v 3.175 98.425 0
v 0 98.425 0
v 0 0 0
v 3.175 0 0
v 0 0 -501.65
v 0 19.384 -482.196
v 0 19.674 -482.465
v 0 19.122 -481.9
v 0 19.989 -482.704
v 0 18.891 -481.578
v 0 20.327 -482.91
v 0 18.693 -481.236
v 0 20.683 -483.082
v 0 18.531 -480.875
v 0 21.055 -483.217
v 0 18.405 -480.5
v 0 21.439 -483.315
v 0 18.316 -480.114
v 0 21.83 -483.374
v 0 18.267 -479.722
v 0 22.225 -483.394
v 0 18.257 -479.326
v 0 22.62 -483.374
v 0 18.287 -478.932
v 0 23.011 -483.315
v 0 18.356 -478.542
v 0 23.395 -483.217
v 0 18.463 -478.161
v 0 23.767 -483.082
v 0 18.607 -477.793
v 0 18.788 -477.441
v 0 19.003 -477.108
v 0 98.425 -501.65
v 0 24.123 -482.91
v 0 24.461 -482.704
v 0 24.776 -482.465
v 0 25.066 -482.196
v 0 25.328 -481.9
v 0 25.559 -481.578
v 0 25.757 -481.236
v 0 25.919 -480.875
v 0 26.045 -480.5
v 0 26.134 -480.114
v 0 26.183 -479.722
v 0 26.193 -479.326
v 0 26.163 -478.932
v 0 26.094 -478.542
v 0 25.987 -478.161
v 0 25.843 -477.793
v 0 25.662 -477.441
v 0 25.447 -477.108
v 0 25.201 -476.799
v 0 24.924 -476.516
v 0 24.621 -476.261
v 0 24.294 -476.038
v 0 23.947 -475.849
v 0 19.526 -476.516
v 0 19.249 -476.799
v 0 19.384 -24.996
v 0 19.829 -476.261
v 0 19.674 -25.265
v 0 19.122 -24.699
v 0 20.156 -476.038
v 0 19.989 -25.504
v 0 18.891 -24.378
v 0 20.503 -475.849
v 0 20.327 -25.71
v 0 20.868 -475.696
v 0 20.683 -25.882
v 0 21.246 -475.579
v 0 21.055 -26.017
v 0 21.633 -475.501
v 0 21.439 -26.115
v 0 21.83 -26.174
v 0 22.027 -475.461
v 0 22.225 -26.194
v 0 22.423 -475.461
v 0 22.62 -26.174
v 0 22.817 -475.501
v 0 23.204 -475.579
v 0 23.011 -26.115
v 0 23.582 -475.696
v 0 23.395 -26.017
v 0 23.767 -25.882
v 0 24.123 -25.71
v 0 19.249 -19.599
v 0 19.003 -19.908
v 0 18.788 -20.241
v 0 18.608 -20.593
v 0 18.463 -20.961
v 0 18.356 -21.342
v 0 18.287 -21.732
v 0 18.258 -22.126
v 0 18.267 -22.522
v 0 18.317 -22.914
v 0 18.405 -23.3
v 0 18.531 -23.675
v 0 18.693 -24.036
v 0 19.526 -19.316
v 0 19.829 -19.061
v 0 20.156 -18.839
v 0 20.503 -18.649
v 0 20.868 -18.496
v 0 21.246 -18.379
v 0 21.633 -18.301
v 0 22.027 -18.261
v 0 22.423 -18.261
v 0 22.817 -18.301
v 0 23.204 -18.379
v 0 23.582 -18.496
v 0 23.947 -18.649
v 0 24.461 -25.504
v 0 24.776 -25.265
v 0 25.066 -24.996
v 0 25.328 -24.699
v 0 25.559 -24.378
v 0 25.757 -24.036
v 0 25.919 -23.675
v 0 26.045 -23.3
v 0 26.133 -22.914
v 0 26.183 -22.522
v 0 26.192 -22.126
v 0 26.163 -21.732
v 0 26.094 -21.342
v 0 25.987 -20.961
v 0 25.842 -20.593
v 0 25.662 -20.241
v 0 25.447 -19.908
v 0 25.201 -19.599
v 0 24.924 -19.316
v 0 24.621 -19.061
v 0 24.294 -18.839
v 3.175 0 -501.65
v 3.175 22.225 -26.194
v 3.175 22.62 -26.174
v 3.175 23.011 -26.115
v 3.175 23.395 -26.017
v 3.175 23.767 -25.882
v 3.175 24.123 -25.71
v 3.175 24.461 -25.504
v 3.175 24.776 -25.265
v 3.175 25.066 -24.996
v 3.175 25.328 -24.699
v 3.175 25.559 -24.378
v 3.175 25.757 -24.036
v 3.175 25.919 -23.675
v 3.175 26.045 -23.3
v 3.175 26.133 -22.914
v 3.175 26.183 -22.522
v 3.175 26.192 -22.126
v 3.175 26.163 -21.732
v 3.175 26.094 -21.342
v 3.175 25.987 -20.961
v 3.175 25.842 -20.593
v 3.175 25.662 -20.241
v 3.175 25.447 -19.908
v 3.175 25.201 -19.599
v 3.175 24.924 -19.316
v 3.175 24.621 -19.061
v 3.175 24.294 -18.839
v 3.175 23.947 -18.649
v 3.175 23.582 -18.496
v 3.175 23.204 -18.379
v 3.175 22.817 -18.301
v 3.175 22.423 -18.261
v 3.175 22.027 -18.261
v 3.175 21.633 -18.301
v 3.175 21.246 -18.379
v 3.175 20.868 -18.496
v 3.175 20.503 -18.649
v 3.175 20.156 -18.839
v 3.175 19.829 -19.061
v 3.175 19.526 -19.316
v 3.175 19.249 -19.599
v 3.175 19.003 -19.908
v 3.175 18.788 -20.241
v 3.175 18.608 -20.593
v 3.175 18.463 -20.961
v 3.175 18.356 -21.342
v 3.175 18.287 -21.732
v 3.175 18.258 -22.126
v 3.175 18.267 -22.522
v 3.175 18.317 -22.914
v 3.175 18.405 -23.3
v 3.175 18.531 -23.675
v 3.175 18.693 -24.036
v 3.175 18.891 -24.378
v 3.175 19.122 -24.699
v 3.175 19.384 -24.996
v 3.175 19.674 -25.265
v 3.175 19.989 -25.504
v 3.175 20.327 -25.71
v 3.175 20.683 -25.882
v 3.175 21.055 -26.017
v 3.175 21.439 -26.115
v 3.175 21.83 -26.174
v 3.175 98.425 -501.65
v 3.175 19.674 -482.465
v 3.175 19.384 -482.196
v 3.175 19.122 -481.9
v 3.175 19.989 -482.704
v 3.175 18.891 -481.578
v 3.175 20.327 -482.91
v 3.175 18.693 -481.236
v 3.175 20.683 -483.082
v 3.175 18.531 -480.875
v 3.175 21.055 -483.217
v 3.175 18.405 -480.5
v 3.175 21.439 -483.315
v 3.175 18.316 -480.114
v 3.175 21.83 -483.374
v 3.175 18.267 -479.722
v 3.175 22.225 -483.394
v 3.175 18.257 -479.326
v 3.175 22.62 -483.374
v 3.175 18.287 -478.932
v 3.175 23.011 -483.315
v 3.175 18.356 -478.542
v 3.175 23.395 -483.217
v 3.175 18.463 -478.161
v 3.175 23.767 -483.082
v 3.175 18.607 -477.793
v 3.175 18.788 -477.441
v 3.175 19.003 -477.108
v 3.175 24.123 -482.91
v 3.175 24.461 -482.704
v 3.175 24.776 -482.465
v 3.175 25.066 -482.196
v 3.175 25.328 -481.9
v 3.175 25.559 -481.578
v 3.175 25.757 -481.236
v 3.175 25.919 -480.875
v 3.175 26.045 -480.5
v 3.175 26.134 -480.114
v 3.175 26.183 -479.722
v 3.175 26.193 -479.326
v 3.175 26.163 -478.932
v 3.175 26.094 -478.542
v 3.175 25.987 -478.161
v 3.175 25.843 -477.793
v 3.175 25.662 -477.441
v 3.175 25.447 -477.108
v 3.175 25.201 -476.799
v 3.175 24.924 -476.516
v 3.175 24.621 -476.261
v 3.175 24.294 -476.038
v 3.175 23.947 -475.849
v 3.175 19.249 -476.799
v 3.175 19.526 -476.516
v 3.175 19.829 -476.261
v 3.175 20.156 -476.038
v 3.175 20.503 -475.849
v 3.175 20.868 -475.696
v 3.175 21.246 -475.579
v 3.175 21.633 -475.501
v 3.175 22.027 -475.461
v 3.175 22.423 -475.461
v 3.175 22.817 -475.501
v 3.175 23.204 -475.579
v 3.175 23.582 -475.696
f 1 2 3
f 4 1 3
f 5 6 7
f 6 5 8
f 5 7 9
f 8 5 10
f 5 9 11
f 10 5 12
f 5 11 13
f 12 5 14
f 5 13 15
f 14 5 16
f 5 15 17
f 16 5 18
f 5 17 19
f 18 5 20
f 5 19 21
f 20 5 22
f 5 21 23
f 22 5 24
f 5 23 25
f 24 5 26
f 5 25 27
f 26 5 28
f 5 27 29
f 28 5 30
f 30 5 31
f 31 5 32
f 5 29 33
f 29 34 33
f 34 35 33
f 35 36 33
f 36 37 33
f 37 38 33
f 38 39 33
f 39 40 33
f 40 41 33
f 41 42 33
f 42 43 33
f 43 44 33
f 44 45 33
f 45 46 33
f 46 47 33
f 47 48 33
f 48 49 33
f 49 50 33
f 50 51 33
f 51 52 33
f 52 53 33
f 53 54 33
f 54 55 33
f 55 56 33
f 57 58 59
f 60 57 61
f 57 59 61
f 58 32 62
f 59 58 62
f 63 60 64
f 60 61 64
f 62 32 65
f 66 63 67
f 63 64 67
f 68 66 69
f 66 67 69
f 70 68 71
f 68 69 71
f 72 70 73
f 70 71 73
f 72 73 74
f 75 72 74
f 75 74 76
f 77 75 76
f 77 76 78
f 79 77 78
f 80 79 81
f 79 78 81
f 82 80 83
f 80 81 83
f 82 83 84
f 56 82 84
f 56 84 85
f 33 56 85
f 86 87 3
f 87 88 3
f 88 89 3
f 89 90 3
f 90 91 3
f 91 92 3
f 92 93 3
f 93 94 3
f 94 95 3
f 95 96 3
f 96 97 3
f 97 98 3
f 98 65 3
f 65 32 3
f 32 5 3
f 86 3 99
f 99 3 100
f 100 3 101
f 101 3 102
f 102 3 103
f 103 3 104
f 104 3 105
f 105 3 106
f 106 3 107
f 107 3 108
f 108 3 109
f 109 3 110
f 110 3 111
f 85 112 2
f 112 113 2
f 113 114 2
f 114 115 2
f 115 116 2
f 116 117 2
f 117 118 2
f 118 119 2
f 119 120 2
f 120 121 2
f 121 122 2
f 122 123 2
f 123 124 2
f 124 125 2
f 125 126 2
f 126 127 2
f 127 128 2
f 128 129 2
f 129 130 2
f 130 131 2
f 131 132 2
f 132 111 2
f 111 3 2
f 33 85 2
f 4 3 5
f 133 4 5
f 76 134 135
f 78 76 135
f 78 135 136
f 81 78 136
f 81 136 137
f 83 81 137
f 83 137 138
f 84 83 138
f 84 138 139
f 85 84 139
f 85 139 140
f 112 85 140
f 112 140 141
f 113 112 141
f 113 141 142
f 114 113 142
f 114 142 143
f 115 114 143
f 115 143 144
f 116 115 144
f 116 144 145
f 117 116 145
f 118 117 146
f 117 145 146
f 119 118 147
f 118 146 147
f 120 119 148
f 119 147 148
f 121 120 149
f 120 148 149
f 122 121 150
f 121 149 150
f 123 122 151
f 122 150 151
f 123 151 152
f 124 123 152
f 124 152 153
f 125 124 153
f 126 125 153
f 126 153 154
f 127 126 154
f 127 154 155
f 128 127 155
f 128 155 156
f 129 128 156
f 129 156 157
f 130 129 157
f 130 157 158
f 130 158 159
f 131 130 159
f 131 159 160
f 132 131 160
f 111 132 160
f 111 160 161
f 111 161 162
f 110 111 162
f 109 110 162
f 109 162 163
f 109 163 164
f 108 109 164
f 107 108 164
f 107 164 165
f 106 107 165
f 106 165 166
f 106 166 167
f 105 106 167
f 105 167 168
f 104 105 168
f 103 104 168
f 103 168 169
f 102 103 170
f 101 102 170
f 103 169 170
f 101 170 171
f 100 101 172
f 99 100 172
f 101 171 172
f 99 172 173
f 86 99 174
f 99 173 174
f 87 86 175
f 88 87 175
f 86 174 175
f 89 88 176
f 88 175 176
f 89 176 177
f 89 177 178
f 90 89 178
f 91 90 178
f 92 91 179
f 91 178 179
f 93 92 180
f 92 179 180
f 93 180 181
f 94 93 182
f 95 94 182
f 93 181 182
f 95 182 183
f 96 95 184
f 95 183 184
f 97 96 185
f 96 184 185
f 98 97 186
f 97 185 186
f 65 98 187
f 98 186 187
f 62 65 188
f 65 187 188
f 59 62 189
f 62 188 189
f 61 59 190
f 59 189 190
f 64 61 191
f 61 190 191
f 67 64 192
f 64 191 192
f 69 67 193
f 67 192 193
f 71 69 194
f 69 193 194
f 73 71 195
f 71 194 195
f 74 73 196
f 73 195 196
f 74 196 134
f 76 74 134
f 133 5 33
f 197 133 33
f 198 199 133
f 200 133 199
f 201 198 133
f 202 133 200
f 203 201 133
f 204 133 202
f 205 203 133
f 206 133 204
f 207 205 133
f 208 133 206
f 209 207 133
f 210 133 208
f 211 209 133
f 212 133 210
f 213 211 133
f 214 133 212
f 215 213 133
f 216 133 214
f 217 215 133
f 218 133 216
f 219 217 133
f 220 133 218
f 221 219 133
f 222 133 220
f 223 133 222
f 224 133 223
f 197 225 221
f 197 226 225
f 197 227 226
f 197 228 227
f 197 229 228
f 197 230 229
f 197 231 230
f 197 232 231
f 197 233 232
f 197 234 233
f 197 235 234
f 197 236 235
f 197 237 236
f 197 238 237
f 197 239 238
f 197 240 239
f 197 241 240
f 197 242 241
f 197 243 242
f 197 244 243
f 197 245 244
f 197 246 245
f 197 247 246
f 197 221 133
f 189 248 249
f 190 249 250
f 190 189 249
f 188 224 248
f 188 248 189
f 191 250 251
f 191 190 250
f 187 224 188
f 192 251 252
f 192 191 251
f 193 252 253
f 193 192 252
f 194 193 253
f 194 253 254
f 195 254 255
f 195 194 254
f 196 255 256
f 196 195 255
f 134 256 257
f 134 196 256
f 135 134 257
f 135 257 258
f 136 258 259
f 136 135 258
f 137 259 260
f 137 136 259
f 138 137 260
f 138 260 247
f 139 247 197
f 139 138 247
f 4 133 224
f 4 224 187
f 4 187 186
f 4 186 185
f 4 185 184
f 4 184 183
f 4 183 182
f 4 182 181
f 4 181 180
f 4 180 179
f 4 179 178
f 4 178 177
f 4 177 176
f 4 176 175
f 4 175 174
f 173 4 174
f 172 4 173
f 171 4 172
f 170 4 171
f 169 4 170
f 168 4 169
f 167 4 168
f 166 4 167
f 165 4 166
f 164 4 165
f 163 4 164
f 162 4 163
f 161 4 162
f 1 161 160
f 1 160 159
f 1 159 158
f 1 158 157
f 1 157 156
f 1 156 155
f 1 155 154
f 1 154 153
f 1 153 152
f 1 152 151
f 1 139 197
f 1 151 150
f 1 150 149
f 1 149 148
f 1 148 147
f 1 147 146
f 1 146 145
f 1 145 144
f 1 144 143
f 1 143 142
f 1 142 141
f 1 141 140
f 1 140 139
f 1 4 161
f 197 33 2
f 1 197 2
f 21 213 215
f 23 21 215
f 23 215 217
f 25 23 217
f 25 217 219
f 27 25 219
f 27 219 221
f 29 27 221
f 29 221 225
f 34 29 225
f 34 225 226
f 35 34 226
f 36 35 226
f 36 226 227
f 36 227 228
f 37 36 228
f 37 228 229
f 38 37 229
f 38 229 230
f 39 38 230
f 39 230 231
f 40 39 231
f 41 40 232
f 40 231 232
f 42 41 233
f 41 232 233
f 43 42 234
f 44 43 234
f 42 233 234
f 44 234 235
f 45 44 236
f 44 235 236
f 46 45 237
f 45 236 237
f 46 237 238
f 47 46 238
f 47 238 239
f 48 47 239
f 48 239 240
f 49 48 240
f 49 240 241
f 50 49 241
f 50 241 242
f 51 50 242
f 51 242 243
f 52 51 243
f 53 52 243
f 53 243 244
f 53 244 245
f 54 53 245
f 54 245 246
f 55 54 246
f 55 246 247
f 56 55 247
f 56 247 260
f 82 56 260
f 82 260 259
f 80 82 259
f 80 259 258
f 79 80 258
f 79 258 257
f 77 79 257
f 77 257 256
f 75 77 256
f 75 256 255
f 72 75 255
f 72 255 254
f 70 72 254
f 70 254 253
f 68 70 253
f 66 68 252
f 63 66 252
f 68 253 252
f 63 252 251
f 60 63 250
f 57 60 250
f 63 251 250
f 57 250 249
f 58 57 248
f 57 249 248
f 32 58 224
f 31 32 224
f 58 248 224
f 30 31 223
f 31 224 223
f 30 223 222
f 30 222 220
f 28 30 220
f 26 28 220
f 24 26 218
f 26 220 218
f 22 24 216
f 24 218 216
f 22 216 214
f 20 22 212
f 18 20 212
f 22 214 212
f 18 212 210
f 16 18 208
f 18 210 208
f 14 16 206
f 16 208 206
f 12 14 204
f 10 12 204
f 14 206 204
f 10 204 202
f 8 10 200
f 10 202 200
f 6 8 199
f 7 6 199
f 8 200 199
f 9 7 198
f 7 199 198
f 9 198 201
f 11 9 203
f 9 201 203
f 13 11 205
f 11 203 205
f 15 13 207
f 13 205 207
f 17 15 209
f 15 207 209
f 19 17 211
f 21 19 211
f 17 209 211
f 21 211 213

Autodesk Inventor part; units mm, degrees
ref_plane "YZ Plane" through (0, 0, 0) normal (1, 0, 0) x (0, 1, 0)
ref_plane "XZ Plane" through (0, 0, 0) normal (0, 1, 0) x (-1, 0, 0)
ref_plane "XY Plane" through (0, 0, 0) normal (0, 0, 1) x (1, 0, 0)
sketch "Sketch1" plane through (0, 0, 0) normal (1, 0, 0) x (0, 1, 0)
  line L0 (0, 0) -> (0, -501.65)
  line L1 (0, -501.65) -> (98.425, -501.65)
  line L2 (98.425, -501.65) -> (98.425, 0)
  line L3 (98.425, 0) -> (0, 0)
  dimension "d0" = 501.65
  dimension "d1" = 98.425
extrude "Extrusion1" add sketch "Sketch1" along normal blind 3.175
sketch "Sketch2" plane through (3.175, 0, 0) normal (1, 0, 0) x (0, 0, -1)
  line L0 (0, 0) -> (501.65, 0) projected
  line L1 (0, 0) -> (0, 22.225)
  line L2 (0, 98.425) -> (0, 0) projected
  line L3 (0, 22.225) -> (22.225, 22.225)
  circle A0 centre (22.225, 22.225) radius 3.9687
  dimension "d4" = 22.225
  dimension "d5" = 22.225
  dimension "d6" = 7.9375
extrude "Extrusion2" cut sketch "Sketch2" against normal blind 3.175
sketch "Sketch3" plane through (3.175, 0, 0) normal (1, 0, 0) x (0, 0, -1)
  line L0 (501.65, 0) -> (501.65, 98.425) projected
  line L1 (501.65, 0) -> (501.65, 22.225)
  line L2 (501.65, 22.225) -> (479.425, 22.225)
  circle A0 centre (479.425, 22.225) radius 3.9688
  point P0 (0, 0)
  dimension "d11" = 22.225
  dimension "d12" = 22.225
  dimension "d13" = 7.9375
extrude "Extrusion3" cut sketch "Sketch3" against normal blind 3.175
properties part number "inner_wall"
